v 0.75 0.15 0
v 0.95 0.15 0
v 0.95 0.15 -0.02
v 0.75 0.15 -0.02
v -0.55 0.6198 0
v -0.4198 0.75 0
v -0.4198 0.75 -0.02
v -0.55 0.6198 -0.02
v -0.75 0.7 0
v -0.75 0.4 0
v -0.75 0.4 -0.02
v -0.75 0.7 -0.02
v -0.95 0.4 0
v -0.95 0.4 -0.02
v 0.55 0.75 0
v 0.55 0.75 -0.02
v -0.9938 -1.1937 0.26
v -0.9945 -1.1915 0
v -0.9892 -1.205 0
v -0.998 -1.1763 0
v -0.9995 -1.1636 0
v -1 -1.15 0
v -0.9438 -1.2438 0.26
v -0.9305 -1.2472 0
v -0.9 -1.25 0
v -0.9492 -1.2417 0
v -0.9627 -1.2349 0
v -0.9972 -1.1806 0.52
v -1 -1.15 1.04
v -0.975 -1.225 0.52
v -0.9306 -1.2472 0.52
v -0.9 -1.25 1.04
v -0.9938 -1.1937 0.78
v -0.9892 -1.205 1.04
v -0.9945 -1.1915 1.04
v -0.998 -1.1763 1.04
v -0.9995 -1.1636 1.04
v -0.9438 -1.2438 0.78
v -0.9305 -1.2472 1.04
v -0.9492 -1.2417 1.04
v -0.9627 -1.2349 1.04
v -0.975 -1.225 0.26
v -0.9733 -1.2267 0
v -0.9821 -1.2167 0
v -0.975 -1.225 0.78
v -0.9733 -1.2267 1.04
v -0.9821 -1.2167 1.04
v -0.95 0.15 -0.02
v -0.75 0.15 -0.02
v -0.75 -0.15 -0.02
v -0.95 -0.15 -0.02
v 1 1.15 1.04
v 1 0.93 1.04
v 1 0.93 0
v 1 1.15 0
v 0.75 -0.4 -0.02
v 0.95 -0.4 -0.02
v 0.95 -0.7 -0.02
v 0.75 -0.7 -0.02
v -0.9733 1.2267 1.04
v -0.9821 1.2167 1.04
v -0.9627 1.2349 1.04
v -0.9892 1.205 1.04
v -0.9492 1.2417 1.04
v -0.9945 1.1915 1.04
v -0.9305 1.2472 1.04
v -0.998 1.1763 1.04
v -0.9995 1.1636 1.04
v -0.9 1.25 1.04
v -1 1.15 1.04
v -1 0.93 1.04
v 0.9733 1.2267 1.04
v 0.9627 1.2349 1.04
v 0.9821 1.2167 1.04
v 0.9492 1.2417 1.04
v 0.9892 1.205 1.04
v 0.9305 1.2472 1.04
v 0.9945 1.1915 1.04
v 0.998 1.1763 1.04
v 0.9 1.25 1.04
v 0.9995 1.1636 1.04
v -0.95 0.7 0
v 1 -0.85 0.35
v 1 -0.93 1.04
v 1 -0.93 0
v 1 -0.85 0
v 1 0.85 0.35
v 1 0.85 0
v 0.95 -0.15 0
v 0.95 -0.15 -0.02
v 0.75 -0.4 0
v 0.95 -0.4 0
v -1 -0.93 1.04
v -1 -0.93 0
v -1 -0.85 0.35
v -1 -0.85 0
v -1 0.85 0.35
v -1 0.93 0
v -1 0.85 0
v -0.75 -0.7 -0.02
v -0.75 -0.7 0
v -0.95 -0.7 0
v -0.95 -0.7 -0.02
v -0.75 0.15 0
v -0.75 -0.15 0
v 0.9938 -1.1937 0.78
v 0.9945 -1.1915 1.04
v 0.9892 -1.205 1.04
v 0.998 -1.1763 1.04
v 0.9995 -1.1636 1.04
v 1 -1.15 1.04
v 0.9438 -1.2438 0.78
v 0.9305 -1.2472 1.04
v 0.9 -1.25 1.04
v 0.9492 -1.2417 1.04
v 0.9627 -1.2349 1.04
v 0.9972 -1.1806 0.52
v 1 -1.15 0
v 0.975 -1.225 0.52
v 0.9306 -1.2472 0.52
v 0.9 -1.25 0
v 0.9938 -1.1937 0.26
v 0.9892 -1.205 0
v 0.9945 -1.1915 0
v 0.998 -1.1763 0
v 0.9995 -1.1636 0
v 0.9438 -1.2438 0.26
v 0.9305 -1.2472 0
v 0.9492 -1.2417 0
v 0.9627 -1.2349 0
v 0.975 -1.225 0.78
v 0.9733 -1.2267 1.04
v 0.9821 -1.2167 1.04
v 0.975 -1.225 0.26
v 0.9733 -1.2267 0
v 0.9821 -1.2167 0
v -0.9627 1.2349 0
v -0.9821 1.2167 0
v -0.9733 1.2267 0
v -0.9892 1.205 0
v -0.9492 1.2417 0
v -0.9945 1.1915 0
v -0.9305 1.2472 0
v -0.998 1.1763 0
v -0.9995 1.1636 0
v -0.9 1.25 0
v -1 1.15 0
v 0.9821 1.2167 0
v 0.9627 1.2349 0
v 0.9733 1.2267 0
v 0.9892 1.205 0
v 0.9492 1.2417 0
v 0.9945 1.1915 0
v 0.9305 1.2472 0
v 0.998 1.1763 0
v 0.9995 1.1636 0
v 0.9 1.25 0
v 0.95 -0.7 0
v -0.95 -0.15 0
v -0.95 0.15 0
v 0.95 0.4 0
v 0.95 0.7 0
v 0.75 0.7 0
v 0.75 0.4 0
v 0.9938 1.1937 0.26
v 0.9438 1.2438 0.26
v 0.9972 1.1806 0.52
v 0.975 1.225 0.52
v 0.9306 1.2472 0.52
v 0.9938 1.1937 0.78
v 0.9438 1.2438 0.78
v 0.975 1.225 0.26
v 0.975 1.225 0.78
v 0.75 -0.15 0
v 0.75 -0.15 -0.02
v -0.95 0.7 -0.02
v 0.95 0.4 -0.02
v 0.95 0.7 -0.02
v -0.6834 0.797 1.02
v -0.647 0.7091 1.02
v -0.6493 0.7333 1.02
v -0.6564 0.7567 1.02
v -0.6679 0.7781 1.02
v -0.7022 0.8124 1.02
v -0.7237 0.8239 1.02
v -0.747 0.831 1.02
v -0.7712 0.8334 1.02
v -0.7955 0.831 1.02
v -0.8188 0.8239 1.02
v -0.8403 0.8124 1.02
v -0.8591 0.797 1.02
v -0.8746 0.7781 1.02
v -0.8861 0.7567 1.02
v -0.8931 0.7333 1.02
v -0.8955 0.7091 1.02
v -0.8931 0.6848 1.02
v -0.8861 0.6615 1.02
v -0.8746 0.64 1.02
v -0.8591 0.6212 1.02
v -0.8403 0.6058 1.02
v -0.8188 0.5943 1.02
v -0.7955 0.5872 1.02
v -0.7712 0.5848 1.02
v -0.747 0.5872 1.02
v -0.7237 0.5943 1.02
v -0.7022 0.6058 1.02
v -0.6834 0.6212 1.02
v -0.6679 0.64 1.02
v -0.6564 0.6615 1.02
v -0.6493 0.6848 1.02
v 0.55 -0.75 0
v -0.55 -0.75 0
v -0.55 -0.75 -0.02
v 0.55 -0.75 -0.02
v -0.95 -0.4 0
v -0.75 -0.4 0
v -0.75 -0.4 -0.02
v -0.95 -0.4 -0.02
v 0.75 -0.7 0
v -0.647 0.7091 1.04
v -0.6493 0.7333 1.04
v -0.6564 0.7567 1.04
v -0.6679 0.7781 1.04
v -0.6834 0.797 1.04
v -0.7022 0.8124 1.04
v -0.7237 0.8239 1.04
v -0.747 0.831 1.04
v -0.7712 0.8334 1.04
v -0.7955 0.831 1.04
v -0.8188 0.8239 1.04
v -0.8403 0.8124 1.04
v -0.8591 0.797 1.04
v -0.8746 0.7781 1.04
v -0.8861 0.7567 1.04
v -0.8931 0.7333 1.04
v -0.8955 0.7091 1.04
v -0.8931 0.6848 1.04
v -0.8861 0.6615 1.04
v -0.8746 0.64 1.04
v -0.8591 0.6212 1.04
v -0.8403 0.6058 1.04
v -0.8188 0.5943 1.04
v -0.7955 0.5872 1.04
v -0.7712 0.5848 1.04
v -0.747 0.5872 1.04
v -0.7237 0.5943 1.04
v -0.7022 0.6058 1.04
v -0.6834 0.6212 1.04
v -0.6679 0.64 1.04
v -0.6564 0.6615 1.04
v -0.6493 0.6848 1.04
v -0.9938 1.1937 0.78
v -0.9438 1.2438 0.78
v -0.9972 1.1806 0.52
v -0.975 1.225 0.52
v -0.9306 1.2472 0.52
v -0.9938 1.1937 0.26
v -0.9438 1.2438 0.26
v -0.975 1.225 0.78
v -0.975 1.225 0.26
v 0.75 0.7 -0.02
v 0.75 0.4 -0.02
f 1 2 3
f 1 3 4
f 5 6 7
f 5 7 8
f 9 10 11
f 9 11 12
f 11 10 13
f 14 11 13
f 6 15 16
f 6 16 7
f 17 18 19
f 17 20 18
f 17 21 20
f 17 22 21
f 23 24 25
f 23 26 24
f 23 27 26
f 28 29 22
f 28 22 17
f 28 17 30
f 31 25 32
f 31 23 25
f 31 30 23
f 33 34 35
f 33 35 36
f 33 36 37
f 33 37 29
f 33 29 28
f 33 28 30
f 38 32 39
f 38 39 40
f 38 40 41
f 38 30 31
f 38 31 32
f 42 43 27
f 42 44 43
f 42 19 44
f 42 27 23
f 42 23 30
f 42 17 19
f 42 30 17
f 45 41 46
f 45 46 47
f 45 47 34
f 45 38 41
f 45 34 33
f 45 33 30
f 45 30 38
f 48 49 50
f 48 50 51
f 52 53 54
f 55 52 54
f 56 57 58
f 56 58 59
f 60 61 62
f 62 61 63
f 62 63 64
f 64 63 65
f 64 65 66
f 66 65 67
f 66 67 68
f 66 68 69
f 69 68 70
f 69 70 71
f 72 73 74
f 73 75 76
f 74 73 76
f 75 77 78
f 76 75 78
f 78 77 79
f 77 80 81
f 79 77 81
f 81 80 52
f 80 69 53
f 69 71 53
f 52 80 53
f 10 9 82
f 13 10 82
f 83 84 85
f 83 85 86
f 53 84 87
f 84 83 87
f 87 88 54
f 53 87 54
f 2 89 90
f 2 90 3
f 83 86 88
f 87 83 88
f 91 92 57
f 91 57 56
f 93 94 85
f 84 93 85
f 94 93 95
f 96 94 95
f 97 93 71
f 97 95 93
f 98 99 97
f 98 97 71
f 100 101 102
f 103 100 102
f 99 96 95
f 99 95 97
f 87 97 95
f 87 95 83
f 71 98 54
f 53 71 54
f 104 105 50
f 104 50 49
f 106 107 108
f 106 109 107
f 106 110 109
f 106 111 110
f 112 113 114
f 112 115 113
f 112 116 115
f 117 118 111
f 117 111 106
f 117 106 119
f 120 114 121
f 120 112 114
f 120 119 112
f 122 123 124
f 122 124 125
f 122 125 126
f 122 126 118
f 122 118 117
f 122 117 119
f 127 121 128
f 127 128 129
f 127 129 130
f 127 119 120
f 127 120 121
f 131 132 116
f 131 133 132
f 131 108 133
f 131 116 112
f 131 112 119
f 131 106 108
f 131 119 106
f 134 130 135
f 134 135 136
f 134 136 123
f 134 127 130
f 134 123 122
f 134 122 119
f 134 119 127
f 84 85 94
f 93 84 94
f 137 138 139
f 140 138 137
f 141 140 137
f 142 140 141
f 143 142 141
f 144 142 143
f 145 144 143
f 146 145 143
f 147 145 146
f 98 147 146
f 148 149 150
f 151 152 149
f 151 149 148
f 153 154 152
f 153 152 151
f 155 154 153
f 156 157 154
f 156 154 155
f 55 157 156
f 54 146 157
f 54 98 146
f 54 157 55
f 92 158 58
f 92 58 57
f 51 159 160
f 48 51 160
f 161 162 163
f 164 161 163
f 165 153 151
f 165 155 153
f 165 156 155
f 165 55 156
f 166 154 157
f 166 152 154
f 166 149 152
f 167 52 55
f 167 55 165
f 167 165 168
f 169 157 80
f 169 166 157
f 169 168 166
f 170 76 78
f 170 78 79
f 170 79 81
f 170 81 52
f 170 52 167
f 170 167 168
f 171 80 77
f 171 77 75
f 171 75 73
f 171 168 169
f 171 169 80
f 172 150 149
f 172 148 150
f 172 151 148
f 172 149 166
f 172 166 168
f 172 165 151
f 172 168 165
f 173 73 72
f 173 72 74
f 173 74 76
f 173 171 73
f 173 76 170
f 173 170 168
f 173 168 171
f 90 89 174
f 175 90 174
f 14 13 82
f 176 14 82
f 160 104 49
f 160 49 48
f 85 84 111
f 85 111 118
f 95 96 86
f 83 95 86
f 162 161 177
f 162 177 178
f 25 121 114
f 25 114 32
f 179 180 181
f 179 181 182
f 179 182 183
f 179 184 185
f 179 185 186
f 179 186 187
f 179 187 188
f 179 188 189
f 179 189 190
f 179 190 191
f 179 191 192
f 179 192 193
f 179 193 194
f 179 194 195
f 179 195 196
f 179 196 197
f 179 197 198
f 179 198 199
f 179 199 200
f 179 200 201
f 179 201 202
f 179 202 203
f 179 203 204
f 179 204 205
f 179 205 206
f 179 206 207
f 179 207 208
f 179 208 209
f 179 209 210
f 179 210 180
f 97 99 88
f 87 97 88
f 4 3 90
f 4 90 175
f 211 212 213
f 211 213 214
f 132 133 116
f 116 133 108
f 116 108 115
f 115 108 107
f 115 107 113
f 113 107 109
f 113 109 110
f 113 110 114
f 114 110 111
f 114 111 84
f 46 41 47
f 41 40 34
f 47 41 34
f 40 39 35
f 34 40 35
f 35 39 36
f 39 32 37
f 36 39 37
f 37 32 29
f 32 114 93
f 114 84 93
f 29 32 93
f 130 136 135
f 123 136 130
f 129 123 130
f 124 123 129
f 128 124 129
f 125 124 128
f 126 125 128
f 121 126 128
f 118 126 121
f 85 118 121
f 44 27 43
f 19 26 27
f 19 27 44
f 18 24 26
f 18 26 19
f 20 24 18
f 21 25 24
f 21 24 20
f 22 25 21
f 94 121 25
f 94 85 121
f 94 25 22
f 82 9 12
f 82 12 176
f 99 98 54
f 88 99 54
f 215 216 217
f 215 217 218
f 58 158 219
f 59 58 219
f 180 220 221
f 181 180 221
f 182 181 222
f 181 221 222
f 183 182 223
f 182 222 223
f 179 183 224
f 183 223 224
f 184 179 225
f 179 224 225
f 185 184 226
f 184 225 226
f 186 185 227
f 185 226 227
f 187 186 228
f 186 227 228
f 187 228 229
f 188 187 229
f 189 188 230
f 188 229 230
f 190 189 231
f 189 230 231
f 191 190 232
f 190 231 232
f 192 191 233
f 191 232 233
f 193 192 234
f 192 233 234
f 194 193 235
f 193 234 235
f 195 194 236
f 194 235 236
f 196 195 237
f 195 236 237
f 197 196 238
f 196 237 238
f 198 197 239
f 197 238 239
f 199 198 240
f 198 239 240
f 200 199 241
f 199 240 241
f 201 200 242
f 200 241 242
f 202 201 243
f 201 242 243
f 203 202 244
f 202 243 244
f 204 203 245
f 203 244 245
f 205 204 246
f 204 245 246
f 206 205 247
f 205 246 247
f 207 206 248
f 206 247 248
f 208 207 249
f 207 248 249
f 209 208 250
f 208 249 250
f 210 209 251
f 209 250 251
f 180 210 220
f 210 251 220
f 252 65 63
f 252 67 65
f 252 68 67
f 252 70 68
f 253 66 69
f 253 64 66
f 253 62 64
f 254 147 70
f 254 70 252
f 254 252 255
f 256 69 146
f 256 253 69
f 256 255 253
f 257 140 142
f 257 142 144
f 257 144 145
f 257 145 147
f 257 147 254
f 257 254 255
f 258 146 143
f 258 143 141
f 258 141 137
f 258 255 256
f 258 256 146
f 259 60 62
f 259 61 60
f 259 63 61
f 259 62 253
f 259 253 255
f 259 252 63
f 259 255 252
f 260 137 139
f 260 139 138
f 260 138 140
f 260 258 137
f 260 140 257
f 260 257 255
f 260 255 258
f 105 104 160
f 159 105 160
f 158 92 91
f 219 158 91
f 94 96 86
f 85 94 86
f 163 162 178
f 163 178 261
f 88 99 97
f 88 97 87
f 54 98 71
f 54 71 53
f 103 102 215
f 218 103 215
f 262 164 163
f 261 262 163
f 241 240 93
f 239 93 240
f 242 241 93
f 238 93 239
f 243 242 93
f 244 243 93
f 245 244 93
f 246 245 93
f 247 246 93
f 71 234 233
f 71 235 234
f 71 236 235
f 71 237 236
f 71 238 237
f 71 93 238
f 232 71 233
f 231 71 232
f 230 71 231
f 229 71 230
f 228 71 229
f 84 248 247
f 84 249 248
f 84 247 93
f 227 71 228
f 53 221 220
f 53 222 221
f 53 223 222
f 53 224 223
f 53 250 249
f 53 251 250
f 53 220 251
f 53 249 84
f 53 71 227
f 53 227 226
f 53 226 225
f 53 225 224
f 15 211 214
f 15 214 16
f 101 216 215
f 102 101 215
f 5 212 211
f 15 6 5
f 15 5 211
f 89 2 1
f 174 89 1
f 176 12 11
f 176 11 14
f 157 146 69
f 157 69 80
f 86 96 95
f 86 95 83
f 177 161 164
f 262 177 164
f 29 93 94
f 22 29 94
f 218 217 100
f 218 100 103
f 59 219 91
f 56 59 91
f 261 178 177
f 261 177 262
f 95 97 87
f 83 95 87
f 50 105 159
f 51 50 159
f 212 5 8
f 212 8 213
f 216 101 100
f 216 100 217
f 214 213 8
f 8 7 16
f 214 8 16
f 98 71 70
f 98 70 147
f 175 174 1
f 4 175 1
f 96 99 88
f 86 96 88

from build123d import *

# Parameters (mm, degrees)
SKETCH1_W             = 2
SKETCH1_H             = 1.86
BOSS_EXTRUDE1_DEPTH   = 1.04
SKETCH8_W             = 2
SKETCH8_H             = 1.04
BOSS_EXTRUDE3_DEPTH   = 0.32
SKETCH10_W            = 2
SKETCH10_H            = 1.04
BOSS_EXTRUDE4_DEPTH   = 0.32
FILLET1_SIZE          = 0.1
FILLET2_SIZE          = 0.1
SKETCH11_W            = 2
SKETCH11_H            = 1.7
CUT_EXTRUDE1_DEPTH    = 0.35
SKETCH11_2_W          = 2
SKETCH11_2_H          = 1.7
BOSS_EXTRUDE5_DEPTH   = 0.35
SKETCH13_W            = 0.2
SKETCH13_H            = 0.3
BOSS_EXTRUDE6_DEPTH   = 0.02
BOSS_EXTRUDE6_2_DEPTH = 0.02
BOSS_EXTRUDE6_3_DEPTH = 0.02
BOSS_EXTRUDE6_4_DEPTH = 0.02
BOSS_EXTRUDE6_5_DEPTH = 0.02
BOSS_EXTRUDE6_6_DEPTH = 0.02
BOSS_EXTRUDE6_7_DEPTH = 0.02
SKETCH14_R            = 0.124288499
CUT_EXTRUDE2_DEPTH    = 0.02


with BuildPart() as part:
    # Sketch1 → Boss-Extrude1 (new body)
    with BuildSketch(Plane.XY):
        Rectangle(SKETCH1_W, SKETCH1_H)
    extrude(amount=BOSS_EXTRUDE1_DEPTH)

    # Sketch11 → Cut-Extrude1 (cut)
    with BuildSketch(Plane.XY):
        Rectangle(SKETCH11_W, SKETCH11_H)
    extrude(amount=CUT_EXTRUDE1_DEPTH, mode=Mode.SUBTRACT)

    # Sketch14 → Cut-Extrude2 (cut)
    with BuildSketch(Plane.XY.offset(1.04)):
        with Locations((-0.771241568, 0.709092923)):
            Circle(SKETCH14_R)
    extrude(amount=-CUT_EXTRUDE2_DEPTH, mode=Mode.SUBTRACT)


with BuildPart() as body_2:
    # Sketch8 → Boss-Extrude3 (new body)
    with BuildSketch(Plane(origin=(0, 0.93, 0), x_dir=(1, 0, 0), z_dir=(0, 1, 0))):
        with Locations((0, -0.52)):
            Rectangle(SKETCH8_W, SKETCH8_H)
    extrude(amount=BOSS_EXTRUDE3_DEPTH)

    # Fillet1
    # a fillet whose section is not a circle: 0.1 mm, written as the material it takes off along each edge
    with BuildSketch(Plane(origin=(1, 1.25, 1.29), x_dir=(0, -1, 0), z_dir=(0, 0, -1)), Plane(origin=(-1, 1.25, -0.25), x_dir=(0, -1, 0), z_dir=(0, 0, 1))) as fillet1_piece_1:
        with BuildLine():
            Bezier((FILLET1_SIZE, 0), (0, 0), (0, FILLET1_SIZE), weights=[1, 1, 1])
            Line((0, FILLET1_SIZE), (0, 0))
            Line((0, 0), (FILLET1_SIZE, 0))
        make_face()
    extrude(amount=1.54, mode=Mode.SUBTRACT)


with BuildPart() as body_3:
    # Sketch10 → Boss-Extrude4 (new body)
    with BuildSketch(Plane(origin=(0, -0.93, 0), x_dir=(-1, 0, 0), z_dir=(0, -1, 0))):
        with Locations((0, -0.52)):
            Rectangle(SKETCH10_W, SKETCH10_H)
    extrude(amount=BOSS_EXTRUDE4_DEPTH)

    # Fillet2
    # a fillet whose section is not a circle: 0.1 mm, written as the material it takes off along each edge
    with BuildSketch(Plane(origin=(1, -1.25, -0.25), x_dir=(0, 1, 0), z_dir=(0, 0, 1)), Plane(origin=(-1, -1.25, 1.29), x_dir=(0, 1, 0), z_dir=(0, 0, -1))) as fillet2_piece_1:
        with BuildLine():
            Bezier((FILLET2_SIZE, 0), (0, 0), (0, FILLET2_SIZE), weights=[1, 1, 1])
            Line((0, FILLET2_SIZE), (0, 0))
            Line((0, 0), (FILLET2_SIZE, 0))
        make_face()
    extrude(amount=1.54, mode=Mode.SUBTRACT)


with BuildPart() as body_4:
    # Sketch11<2> → Boss-Extrude5 (new body)
    with BuildSketch(Plane.XY):
        Rectangle(SKETCH11_2_W, SKETCH11_2_H)
    extrude(amount=BOSS_EXTRUDE5_DEPTH)


with BuildPart() as body_5:
    # Sketch13 → Boss-Extrude6 (new body)
    with BuildSketch(Plane(origin=(0, 0, 0), x_dir=(-1, 0, 0), z_dir=(0, 0, -1))):
        with Locations((-0.85, 0)):
            Rectangle(SKETCH13_W, SKETCH13_H)
    extrude(amount=BOSS_EXTRUDE6_DEPTH)


with BuildPart() as body_6:
    # Sketch13 → Boss-Extrude6 2 (new body)
    with BuildSketch(Plane(origin=(0, 0, 0), x_dir=(-1, 0, 0), z_dir=(0, 0, -1))):
        Polygon((-0.55, 0.75), (0.419840261, 0.75), (0.55, 0.619840261), (0.55, -0.75), (-0.55, -0.75), align=None)
    extrude(amount=BOSS_EXTRUDE6_2_DEPTH)


with BuildPart() as body_7:
    # Sketch13 → Boss-Extrude6 3 (new body)
    with BuildSketch(Plane(origin=(0, 0, 0), x_dir=(-1, 0, 0), z_dir=(0, 0, -1))):
        with Locations((0.85, 0)):
            Rectangle(SKETCH13_W, SKETCH13_H)
    extrude(amount=BOSS_EXTRUDE6_3_DEPTH)


with BuildPart() as body_8:
    # Sketch13 → Boss-Extrude6 4 (new body)
    with BuildSketch(Plane(origin=(0, 0, 0), x_dir=(-1, 0, 0), z_dir=(0, 0, -1))):
        with Locations((0.85, 0.55)):
            Rectangle(SKETCH13_W, SKETCH13_H)
    extrude(amount=BOSS_EXTRUDE6_4_DEPTH)


with BuildPart() as body_9:
    # Sketch13 → Boss-Extrude6 5 (new body)
    with BuildSketch(Plane(origin=(0, 0, 0), x_dir=(-1, 0, 0), z_dir=(0, 0, -1))):
        with Locations((-0.85, 0.55)):
            Rectangle(SKETCH13_W, SKETCH13_H)
    extrude(amount=BOSS_EXTRUDE6_5_DEPTH)


with BuildPart() as body_10:
    # Sketch13 → Boss-Extrude6 6 (new body)
    with BuildSketch(Plane(origin=(0, 0, 0), x_dir=(-1, 0, 0), z_dir=(0, 0, -1))):
        with Locations((0.85, -0.55)):
            Rectangle(SKETCH13_W, SKETCH13_H)
    extrude(amount=BOSS_EXTRUDE6_6_DEPTH)


with BuildPart() as body_11:
    # Sketch13 → Boss-Extrude6 7 (new body)
    with BuildSketch(Plane(origin=(0, 0, 0), x_dir=(-1, 0, 0), z_dir=(0, 0, -1))):
        with Locations((-0.85, -0.55)):
            Rectangle(SKETCH13_W, SKETCH13_H)
    extrude(amount=BOSS_EXTRUDE6_7_DEPTH)


solid = Compound([part.part, body_2.part, body_3.part, body_4.part, body_5.part, body_6.part, body_7.part, body_8.part, body_9.part, body_10.part, body_11.part])
